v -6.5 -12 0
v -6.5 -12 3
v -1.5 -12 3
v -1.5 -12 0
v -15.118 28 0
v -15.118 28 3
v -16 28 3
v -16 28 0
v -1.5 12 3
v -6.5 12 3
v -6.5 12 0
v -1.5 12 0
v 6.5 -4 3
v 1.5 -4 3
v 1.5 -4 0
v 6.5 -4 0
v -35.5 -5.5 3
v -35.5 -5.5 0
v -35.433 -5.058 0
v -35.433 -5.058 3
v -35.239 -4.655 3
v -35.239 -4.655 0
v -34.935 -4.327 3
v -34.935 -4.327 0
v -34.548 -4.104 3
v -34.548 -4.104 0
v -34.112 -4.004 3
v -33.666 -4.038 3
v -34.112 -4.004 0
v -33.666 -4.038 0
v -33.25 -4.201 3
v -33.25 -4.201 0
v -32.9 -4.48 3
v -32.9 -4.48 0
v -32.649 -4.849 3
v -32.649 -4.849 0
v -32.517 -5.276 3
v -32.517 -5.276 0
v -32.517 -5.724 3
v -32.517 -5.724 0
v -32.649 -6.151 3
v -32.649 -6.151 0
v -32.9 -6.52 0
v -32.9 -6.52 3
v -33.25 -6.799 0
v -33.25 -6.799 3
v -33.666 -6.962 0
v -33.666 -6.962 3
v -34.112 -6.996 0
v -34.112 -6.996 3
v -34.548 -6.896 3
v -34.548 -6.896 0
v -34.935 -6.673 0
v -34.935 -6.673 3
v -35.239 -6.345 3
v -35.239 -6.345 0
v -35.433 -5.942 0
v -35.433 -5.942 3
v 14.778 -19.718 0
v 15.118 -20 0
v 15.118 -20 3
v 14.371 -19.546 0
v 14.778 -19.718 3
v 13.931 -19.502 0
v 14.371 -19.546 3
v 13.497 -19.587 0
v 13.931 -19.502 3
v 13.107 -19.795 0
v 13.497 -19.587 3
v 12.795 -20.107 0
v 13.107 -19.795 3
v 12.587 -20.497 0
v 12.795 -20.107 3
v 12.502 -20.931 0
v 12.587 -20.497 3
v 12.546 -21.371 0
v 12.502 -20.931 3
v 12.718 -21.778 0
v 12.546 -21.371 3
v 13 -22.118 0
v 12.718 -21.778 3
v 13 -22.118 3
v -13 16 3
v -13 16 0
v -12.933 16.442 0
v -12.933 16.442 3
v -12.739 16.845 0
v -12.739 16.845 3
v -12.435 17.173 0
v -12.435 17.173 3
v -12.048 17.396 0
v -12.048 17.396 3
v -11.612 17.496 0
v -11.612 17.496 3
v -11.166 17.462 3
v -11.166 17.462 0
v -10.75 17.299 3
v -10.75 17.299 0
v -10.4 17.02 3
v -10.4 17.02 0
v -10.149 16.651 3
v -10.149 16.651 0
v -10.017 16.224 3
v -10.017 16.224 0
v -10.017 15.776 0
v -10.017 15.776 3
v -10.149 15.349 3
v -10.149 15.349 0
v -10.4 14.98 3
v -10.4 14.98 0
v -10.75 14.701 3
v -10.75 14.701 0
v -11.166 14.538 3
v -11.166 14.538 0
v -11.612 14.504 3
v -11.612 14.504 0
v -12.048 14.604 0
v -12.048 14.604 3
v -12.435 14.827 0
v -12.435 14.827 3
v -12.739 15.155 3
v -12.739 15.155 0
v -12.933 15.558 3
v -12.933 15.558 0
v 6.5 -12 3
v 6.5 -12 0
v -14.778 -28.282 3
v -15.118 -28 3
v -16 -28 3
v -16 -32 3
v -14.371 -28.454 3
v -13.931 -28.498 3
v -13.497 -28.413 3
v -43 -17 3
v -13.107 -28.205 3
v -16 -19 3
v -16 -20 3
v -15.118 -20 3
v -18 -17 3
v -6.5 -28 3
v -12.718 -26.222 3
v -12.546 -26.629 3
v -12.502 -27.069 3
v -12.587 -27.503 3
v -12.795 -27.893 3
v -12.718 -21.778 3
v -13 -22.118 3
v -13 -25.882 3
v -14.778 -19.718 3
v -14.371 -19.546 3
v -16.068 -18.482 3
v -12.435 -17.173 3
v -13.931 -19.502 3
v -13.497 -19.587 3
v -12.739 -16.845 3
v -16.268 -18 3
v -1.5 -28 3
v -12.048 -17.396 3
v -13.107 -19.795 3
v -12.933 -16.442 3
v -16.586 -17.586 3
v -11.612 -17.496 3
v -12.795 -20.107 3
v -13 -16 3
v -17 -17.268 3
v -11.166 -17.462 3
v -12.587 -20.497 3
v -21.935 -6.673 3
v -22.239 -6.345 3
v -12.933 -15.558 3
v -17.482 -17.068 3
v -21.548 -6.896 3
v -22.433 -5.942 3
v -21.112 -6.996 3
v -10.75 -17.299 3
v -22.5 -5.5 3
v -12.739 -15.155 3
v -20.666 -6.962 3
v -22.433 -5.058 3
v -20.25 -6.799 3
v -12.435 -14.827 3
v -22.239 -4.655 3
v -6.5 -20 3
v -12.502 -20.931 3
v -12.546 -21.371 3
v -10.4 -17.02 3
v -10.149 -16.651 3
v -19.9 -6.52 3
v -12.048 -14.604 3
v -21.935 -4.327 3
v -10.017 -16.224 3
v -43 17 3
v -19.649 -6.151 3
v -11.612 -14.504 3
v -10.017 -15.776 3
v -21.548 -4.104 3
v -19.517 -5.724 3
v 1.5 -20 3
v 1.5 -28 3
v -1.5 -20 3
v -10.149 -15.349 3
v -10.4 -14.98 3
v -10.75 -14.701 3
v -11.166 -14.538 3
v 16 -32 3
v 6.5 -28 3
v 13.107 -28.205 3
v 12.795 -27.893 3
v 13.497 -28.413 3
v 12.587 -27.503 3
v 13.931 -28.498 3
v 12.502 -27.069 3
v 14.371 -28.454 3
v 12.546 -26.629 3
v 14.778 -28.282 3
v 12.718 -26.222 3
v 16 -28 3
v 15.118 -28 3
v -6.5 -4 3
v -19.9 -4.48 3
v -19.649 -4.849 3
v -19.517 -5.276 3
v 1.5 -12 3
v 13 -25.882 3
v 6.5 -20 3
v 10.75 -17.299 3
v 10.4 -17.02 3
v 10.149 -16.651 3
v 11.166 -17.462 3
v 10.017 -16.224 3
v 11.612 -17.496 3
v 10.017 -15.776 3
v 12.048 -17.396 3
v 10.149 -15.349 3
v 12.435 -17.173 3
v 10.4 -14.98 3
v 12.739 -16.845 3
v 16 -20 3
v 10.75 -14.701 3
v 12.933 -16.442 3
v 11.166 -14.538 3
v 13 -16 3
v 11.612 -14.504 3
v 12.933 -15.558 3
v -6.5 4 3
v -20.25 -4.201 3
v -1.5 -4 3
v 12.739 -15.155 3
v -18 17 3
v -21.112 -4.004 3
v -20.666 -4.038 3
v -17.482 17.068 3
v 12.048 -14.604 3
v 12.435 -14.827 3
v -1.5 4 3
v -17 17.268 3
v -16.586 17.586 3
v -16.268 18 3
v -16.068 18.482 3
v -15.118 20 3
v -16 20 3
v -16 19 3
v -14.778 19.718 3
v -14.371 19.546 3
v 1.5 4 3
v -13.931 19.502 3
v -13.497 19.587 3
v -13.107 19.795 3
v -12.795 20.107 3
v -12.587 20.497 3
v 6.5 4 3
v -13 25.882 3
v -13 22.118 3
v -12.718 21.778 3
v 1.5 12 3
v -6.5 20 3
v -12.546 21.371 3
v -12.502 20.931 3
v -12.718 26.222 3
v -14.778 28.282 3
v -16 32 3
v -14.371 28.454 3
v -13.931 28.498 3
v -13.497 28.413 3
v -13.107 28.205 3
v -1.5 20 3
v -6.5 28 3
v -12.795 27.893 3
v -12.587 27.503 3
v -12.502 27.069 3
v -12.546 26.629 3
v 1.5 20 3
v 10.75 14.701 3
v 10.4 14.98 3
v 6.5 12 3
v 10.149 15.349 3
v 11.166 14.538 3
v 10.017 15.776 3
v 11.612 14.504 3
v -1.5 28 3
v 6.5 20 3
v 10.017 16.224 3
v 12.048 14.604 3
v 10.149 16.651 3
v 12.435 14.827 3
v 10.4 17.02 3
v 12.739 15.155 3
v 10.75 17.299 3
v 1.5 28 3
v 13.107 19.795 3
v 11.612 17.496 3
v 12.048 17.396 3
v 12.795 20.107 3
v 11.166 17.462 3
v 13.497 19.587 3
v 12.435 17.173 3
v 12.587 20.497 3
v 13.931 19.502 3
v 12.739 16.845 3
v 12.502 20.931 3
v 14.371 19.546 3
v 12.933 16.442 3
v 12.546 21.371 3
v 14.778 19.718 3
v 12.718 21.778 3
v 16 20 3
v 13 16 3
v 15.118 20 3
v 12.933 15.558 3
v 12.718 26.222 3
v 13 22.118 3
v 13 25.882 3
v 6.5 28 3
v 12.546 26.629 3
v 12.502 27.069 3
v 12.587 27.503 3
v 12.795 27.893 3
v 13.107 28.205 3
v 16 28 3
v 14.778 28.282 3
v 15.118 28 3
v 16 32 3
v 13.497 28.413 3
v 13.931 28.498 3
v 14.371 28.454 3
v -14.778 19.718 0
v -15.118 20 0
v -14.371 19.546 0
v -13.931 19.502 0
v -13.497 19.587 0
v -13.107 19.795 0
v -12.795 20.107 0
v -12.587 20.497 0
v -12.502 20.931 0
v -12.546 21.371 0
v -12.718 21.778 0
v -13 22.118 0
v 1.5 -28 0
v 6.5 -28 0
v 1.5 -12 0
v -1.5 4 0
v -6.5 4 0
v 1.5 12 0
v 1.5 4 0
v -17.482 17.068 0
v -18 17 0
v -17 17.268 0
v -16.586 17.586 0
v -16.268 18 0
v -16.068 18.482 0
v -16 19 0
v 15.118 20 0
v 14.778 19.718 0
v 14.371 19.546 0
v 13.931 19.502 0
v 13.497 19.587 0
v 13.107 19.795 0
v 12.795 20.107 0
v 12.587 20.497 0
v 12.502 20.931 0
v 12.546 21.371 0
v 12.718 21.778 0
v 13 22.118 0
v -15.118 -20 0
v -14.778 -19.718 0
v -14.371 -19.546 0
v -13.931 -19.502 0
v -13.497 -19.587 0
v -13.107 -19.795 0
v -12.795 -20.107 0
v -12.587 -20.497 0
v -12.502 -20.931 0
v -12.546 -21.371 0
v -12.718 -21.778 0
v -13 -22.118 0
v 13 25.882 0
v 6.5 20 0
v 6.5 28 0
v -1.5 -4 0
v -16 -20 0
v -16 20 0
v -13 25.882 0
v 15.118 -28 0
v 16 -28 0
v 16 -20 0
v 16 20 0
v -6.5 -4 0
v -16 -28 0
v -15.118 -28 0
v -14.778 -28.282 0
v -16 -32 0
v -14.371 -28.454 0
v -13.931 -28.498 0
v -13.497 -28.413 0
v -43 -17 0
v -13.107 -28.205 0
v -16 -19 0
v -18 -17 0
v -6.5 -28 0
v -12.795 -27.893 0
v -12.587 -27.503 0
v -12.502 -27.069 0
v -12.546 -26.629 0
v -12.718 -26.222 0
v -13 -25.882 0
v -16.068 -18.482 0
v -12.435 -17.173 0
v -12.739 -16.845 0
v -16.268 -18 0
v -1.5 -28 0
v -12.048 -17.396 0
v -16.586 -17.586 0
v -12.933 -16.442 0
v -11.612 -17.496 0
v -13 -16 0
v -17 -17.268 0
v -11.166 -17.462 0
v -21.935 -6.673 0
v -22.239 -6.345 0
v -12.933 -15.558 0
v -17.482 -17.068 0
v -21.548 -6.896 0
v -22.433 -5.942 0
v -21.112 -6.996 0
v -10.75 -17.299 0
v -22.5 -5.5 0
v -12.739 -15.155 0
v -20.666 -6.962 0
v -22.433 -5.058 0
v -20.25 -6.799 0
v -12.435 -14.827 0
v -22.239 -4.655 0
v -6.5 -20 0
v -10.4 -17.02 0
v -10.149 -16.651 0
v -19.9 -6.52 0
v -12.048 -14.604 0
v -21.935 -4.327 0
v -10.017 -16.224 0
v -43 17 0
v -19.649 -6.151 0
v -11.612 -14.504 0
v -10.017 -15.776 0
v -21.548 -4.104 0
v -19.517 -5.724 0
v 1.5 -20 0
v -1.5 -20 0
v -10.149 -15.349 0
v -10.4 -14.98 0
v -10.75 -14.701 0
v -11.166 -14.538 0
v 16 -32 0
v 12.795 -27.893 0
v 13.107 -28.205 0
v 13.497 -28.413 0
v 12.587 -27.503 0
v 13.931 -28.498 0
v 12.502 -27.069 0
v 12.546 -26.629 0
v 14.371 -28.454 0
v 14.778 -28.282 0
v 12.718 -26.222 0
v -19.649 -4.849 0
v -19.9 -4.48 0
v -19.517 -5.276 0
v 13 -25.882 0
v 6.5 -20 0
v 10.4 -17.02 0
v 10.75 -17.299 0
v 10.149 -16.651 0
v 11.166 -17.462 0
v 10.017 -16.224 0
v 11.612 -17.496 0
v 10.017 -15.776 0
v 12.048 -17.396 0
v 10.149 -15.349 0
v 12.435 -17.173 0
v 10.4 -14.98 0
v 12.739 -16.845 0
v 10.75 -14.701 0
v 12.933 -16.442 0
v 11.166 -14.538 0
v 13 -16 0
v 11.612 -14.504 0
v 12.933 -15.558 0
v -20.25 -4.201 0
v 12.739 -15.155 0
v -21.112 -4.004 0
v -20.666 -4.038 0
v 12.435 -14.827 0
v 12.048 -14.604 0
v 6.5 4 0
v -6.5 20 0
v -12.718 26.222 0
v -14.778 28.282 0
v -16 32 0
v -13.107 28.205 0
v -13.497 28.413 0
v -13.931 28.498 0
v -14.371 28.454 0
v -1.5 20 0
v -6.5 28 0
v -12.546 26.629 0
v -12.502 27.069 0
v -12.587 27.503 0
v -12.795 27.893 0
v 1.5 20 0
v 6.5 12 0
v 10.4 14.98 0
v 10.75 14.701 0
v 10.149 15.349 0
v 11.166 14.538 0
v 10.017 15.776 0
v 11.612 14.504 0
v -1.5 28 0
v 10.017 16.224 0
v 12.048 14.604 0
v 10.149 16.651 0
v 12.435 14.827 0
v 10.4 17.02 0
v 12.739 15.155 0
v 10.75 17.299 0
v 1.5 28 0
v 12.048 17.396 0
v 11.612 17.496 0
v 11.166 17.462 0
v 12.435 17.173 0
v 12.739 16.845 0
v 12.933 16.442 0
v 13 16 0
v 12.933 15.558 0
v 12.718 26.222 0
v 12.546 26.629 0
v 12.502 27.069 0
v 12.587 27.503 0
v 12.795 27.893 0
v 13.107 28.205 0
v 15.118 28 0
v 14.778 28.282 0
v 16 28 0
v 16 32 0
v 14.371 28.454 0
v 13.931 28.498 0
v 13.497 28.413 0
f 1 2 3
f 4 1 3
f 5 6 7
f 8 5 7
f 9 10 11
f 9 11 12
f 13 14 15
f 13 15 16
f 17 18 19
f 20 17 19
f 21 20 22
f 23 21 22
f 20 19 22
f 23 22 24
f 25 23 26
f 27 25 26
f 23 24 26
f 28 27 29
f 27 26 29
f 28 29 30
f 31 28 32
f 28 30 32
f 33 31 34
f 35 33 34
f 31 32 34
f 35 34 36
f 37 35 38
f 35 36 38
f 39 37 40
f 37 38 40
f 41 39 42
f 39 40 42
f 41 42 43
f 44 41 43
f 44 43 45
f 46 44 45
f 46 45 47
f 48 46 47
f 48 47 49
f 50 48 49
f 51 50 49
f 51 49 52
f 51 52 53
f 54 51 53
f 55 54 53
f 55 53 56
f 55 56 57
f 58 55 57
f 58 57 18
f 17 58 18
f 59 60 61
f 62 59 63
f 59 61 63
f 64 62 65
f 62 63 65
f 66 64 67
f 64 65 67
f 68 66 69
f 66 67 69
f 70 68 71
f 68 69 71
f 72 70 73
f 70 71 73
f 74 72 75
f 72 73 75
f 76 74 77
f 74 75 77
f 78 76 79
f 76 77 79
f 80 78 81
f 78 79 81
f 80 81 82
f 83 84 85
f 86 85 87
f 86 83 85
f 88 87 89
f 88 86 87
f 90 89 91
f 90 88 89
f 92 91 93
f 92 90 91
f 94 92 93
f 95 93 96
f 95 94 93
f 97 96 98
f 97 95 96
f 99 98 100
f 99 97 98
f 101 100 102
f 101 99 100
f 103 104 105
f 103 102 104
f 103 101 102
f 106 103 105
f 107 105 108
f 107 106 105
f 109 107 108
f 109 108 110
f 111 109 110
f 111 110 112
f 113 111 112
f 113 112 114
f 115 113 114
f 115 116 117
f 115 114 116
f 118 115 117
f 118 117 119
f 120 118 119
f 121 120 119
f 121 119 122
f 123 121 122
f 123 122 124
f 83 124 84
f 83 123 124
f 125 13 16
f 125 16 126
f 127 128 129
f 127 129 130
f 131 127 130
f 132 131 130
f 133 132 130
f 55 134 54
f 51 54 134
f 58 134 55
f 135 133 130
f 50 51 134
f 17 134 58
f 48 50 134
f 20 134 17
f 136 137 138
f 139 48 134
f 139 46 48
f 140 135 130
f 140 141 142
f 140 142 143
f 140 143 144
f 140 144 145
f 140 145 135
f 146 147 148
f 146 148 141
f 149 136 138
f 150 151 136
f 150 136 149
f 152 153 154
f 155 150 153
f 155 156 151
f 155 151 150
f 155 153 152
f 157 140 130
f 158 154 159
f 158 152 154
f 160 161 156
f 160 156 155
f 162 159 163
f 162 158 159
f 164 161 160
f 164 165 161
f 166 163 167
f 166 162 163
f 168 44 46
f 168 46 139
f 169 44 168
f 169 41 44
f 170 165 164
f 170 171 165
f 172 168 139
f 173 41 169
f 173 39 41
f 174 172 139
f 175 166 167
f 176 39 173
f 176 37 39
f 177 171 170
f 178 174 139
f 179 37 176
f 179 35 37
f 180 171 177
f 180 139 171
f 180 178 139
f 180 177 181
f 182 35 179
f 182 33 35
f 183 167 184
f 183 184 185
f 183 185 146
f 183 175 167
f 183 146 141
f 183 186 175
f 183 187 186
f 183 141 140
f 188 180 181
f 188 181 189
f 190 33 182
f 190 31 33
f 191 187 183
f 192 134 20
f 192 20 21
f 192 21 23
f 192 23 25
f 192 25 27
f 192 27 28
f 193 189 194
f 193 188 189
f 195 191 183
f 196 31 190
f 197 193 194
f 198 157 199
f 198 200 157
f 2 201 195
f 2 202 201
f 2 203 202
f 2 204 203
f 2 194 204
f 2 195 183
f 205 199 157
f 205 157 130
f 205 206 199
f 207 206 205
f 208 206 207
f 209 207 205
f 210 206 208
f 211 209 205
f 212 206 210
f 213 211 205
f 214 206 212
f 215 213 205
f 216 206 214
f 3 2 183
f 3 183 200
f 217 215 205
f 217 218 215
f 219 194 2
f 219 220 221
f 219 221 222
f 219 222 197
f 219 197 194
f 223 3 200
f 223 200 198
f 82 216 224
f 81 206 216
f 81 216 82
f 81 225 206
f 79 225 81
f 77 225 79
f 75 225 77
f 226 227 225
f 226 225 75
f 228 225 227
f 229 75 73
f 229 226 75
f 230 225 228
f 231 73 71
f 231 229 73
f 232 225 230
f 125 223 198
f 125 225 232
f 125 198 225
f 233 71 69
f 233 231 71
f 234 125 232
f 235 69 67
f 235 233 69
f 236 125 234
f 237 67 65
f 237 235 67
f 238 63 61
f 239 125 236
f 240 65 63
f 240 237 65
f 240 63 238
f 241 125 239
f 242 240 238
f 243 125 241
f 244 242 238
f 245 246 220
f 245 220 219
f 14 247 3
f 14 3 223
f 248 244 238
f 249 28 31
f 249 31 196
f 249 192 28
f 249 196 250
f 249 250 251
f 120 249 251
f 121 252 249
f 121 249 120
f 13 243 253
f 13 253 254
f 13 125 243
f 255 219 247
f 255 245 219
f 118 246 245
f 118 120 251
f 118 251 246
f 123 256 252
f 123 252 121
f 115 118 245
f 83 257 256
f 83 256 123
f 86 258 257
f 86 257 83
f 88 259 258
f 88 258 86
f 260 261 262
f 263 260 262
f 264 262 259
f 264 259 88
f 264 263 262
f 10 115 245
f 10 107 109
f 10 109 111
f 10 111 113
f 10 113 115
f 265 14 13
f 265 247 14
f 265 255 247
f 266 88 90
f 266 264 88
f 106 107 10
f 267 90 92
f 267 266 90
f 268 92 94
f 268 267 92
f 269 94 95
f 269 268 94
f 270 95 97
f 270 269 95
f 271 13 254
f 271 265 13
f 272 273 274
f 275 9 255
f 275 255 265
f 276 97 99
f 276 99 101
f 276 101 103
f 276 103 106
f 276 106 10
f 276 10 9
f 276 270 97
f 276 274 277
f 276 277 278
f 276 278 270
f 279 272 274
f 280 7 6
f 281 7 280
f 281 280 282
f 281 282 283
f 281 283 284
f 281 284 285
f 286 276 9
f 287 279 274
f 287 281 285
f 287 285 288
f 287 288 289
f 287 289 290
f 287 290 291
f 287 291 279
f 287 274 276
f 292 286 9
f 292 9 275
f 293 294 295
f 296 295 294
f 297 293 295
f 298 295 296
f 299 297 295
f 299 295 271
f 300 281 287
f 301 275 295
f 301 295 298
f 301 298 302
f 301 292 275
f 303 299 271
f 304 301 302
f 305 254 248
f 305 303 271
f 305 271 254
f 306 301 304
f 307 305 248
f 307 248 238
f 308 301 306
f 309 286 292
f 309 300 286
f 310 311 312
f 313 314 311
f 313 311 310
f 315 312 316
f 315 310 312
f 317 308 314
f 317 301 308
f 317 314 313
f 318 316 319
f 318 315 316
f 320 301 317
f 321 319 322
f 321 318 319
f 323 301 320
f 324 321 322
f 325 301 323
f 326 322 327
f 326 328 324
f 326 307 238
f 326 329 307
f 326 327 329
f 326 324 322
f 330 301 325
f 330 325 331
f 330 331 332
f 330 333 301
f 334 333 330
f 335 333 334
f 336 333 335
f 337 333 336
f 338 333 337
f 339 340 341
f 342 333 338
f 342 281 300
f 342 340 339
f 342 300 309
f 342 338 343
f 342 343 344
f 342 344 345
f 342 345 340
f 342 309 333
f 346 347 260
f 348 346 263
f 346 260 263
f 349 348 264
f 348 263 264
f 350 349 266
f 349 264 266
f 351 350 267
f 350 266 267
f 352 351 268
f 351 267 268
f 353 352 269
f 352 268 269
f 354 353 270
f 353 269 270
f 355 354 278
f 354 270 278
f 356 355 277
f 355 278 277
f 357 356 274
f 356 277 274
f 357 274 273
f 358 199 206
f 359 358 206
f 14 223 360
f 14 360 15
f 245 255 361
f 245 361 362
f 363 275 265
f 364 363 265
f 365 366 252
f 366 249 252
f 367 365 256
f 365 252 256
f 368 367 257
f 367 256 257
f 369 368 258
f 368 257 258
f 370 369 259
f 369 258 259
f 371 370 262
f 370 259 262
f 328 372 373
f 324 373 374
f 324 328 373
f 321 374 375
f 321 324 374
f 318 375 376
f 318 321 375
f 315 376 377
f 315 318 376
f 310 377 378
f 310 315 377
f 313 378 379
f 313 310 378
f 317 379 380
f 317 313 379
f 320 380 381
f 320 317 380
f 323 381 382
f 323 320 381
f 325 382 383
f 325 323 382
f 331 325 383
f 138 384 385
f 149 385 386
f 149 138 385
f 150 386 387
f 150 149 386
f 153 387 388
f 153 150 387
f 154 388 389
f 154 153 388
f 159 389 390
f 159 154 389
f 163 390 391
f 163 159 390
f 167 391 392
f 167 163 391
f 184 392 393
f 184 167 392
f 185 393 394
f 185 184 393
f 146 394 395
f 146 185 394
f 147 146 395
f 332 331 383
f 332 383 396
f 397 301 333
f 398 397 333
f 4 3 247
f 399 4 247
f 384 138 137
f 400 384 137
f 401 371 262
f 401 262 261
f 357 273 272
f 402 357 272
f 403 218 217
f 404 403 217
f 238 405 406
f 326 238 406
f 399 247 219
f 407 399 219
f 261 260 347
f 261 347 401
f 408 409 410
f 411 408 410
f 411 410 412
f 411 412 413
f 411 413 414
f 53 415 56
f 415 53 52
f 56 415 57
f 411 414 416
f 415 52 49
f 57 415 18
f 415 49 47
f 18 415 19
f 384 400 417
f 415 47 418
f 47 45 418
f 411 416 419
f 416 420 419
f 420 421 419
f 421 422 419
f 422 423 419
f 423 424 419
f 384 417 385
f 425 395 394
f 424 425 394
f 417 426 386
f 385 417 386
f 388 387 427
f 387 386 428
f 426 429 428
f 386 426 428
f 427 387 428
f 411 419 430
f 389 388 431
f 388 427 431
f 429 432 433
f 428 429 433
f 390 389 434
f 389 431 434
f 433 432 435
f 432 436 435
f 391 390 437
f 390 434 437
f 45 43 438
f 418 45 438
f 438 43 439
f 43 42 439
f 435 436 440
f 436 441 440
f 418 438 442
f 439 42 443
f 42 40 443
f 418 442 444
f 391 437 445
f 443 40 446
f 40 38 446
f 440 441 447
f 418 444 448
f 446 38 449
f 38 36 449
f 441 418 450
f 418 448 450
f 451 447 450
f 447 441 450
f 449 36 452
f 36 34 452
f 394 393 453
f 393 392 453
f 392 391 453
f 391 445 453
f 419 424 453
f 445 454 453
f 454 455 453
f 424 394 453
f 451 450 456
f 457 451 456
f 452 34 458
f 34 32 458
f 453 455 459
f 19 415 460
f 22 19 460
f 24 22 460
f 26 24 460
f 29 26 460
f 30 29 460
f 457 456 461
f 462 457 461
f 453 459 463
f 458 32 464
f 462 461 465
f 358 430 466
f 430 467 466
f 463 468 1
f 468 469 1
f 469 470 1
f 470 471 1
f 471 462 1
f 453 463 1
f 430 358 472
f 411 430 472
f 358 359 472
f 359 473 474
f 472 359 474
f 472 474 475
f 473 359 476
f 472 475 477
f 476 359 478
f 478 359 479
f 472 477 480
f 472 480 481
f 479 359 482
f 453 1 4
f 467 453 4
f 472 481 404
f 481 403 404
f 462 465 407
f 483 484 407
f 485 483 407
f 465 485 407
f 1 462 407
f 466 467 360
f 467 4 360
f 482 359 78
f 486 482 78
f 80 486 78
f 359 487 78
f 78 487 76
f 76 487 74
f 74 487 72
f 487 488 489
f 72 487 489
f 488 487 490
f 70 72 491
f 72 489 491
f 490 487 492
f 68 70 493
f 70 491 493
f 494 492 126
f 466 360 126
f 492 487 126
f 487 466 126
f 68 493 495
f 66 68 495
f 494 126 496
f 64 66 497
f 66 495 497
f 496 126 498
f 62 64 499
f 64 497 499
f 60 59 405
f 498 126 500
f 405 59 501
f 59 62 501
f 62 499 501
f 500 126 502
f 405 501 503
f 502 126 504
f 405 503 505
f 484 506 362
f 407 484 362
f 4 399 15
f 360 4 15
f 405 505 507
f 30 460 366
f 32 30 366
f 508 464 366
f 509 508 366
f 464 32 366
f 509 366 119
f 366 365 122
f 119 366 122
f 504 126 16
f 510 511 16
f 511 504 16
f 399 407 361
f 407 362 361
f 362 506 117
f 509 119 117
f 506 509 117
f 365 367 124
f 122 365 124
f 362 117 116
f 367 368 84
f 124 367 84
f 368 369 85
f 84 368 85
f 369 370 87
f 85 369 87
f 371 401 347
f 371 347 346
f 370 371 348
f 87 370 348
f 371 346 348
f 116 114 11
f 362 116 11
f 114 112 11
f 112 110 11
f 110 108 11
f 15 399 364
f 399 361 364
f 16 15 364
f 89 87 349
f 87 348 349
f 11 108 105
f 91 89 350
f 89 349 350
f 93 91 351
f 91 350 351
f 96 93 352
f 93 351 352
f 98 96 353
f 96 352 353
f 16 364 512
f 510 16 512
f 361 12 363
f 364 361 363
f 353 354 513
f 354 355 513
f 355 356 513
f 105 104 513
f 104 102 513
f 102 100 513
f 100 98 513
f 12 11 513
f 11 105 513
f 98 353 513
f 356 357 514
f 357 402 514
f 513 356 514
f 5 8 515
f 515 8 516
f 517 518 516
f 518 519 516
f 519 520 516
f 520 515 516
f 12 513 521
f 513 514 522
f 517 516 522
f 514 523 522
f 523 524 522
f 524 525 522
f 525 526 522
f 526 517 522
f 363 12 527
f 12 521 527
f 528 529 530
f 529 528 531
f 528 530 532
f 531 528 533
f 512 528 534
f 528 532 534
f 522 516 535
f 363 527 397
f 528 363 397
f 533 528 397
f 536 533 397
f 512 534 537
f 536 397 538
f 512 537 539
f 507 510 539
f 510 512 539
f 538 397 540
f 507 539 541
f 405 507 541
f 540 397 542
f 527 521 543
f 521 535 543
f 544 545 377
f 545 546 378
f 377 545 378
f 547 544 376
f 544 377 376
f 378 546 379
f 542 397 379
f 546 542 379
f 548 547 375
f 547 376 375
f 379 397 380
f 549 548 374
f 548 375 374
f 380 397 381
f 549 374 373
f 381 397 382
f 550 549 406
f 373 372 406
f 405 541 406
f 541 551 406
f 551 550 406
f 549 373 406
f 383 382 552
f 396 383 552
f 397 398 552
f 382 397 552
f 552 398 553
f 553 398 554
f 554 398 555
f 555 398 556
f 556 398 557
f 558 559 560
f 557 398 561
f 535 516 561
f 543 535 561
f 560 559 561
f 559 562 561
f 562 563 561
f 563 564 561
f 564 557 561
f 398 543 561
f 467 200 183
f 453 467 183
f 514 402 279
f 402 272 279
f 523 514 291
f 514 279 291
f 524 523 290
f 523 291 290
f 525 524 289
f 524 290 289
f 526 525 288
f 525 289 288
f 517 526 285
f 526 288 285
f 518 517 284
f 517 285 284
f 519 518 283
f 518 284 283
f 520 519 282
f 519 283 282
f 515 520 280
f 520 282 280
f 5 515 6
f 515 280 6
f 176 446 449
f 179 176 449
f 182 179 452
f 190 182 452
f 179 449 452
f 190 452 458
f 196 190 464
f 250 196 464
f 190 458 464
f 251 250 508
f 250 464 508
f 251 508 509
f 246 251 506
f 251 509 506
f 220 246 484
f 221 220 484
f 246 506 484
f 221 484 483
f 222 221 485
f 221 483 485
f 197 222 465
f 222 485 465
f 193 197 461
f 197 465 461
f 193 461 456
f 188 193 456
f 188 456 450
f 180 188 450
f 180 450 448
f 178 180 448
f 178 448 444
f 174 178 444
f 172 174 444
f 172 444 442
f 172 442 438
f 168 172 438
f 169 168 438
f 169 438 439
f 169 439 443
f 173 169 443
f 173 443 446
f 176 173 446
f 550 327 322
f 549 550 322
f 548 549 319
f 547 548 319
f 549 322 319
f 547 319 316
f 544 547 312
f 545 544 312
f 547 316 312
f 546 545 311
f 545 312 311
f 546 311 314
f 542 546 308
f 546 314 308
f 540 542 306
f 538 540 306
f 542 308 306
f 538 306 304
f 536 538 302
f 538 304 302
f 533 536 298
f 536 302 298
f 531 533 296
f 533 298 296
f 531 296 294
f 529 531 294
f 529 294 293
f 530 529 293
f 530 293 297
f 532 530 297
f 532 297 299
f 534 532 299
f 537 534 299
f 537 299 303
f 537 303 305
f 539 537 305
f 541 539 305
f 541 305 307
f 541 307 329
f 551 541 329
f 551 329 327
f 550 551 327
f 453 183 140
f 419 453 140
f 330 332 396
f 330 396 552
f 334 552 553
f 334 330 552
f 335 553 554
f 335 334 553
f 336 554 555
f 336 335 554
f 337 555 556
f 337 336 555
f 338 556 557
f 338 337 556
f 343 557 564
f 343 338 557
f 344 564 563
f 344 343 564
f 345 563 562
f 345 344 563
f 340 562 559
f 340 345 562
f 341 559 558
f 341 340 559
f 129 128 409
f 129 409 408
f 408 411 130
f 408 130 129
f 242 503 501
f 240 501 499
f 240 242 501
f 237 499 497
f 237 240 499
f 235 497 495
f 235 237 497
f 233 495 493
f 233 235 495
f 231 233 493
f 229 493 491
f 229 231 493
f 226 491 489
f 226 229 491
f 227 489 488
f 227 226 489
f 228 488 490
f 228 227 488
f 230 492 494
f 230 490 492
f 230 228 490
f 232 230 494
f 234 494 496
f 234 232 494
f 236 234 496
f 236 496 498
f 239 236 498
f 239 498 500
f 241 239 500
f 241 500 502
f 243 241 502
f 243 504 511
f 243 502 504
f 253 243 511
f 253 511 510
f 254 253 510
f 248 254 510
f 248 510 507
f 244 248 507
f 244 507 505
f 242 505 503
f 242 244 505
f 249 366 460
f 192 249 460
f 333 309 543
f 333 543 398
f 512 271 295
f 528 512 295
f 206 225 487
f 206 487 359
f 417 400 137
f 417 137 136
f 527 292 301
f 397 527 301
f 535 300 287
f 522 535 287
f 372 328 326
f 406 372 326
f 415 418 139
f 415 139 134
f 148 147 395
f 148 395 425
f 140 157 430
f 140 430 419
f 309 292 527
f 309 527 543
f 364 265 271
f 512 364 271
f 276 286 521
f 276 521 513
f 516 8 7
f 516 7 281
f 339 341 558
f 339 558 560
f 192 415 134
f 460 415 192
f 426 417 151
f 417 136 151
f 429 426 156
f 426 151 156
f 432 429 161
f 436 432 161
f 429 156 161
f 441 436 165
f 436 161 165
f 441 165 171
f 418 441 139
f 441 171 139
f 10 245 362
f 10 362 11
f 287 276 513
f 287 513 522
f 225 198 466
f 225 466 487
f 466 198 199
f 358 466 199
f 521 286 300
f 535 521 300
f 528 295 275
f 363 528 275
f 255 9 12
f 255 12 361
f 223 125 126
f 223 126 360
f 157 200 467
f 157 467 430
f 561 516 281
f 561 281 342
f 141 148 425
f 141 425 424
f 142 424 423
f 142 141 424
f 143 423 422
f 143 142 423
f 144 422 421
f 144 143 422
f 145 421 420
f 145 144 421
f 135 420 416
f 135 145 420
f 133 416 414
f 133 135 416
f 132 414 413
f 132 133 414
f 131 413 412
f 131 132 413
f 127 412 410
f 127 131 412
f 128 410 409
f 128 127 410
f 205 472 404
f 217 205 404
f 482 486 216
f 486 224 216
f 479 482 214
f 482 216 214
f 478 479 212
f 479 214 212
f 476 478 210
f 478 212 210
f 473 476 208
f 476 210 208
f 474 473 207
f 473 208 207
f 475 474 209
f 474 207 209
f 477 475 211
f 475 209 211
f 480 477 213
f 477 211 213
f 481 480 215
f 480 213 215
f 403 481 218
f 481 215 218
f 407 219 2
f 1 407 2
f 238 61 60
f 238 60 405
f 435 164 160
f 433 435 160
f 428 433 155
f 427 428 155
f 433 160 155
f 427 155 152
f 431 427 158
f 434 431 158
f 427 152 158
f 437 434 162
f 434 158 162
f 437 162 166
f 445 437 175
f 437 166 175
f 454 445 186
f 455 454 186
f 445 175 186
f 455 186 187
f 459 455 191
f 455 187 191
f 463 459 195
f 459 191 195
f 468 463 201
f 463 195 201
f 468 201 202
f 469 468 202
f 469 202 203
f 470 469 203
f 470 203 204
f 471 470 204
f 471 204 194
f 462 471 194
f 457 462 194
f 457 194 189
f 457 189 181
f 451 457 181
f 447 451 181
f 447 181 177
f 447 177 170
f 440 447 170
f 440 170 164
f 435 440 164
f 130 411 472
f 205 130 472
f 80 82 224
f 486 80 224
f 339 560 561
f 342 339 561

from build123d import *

# Parameters (mm, degrees)
SKETCH_1_W                = 32
SKETCH_1_H                = 64
EXTRUDE_1_DEPTH           = 3
SKETCH_2_W                = 2.5
SKETCH_2_H                = 4
CUT_EXTRUDE_1_DEPTH       = 36.902646142
MIRROR_2_COPY_1_SKETCH_W  = 2.5
MIRROR_2_COPY_1_SKETCH_H  = 4
MIRROR_2_COPY_1_DEPTH     = 36.902646142
SKETCH_4_W                = 3
SKETCH_4_H                = 8
CUT_EXTRUDE_3_DEPTH       = 36.902646142
MIRROR_6_COPY_1_SKETCH_W  = 3
MIRROR_6_COPY_1_SKETCH_H  = 8
MIRROR_6_COPY_1_DEPTH     = 36.902646142
SKETCH_6_W                = 3
SKETCH_6_H                = 8
CUT_EXTRUDE_4_DEPTH       = 36.902646142
MIRROR_8_COPY_1_SKETCH_W  = 3
MIRROR_8_COPY_1_SKETCH_H  = 8
MIRROR_8_COPY_1_DEPTH     = 36.902646142
SKETCH_7_R                = 1.5
CUT_EXTRUDE_5_DEPTH       = 36.902646142
MIRROR_10_COPY_1_SKETCH_R = 1.5
MIRROR_10_COPY_1_DEPTH    = 36.902646142
SKETCH_8_R                = 1.5
CUT_EXTRUDE_6_DEPTH       = 36.902646142
MIRROR_12_COPY_1_SKETCH_R = 1.5
MIRROR_12_COPY_1_DEPTH    = 36.902646142
SKETCH_11_R               = 1.5
CUT_EXTRUDE_9_DEPTH       = 36.902646142
MIRROR_16_COPY_1_SKETCH_R = 1.5
MIRROR_16_COPY_1_DEPTH    = 36.902646142
SKETCH_12_W               = 5
SKETCH_12_H               = 8
CUT_EXTRUDE_10_DEPTH      = 36.902646142
MIRROR_18_COPY_1_SKETCH_W = 5
MIRROR_18_COPY_1_SKETCH_H = 8
MIRROR_18_COPY_1_DEPTH    = 36.902646142
SKETCH_13_W               = 3.954651238
SKETCH_13_H               = 10.848263898
SKETCH_13_W_2             = 4.227382692
SKETCH_13_H_2             = 10.655405874
EXTRUDE_2_DEPTH           = 3
SKETCH_14_W               = 27
SKETCH_14_H               = 34
EXTRUDE_3_DEPTH           = 3
SKETCH_15_R               = 1.5
CUT_EXTRUDE_11_DEPTH      = 54.684262126
FILLET_1_R                = 2


with BuildPart() as part:
    # 草图1 → 凸台-拉伸1 (new body)
    with BuildSketch(Plane.XY):
        Rectangle(SKETCH_1_W, SKETCH_1_H)
    extrude(amount=EXTRUDE_1_DEPTH)

    # 草图2 → 切除-拉伸1 (cut, through all)
    with BuildSketch(Plane.XY.offset(3)):
        Polygon((4, 8), (4, 4), (6.5, 4), (6.5, 12), (1.5, 12), (1.5, 8), align=None)
        with Locations((2.75, 6)):
            Rectangle(SKETCH_2_W, SKETCH_2_H)
    cut_extrude_1 = extrude(amount=-CUT_EXTRUDE_1_DEPTH, mode=Mode.SUBTRACT)

    # 镜向1: 切除-拉伸1 across plane
    add(cut_extrude_1.mirror(Plane(origin=(0, 0, 0), x_dir=(0, 0, 1), z_dir=(1, 0, 0))), mode=Mode.SUBTRACT)

    # 镜向2: 切除-拉伸1 across plane
    add(cut_extrude_1.mirror(Plane.ZX), mode=Mode.SUBTRACT)

    # 镜向2 copy 1 sketch → 镜向2 copy 1 (cut, through all)
    with BuildSketch(Plane(origin=(0, 0, 3), x_dir=(-1, 0, 0), z_dir=(0, 0, 1))):
        Polygon((4, 8), (4, 4), (6.5, 4), (6.5, 12), (1.5, 12), (1.5, 8), align=None)
        with Locations((2.75, 6)):
            Rectangle(MIRROR_2_COPY_1_SKETCH_W, MIRROR_2_COPY_1_SKETCH_H)
    extrude(amount=-MIRROR_2_COPY_1_DEPTH, mode=Mode.SUBTRACT)

    # 草图4 → 切除-拉伸3 (cut, through all)
    with BuildSketch(Plane.XY.offset(3)):
        with Locations((14.5, 8)):
            Rectangle(SKETCH_4_W, SKETCH_4_H)
    cut_extrude_3 = extrude(amount=-CUT_EXTRUDE_3_DEPTH, mode=Mode.SUBTRACT)

    # 镜向5: 切除-拉伸3 across plane
    add(cut_extrude_3.mirror(Plane(origin=(0, 0, 0), x_dir=(0, 0, 1), z_dir=(1, 0, 0))), mode=Mode.SUBTRACT)

    # 镜向6: 切除-拉伸3 across plane
    add(cut_extrude_3.mirror(Plane.ZX), mode=Mode.SUBTRACT)

    # 镜向6 copy 1 sketch → 镜向6 copy 1 (cut, through all)
    with BuildSketch(Plane(origin=(0, 0, 3), x_dir=(-1, 0, 0), z_dir=(0, 0, 1))):
        with Locations((14.5, 8)):
            Rectangle(MIRROR_6_COPY_1_SKETCH_W, MIRROR_6_COPY_1_SKETCH_H)
    extrude(amount=-MIRROR_6_COPY_1_DEPTH, mode=Mode.SUBTRACT)

    # 草图6 → 切除-拉伸4 (cut, through all)
    with BuildSketch(Plane.XY.offset(3)):
        with Locations((14.5, 24)):
            Rectangle(SKETCH_6_W, SKETCH_6_H)
    cut_extrude_4 = extrude(amount=-CUT_EXTRUDE_4_DEPTH, mode=Mode.SUBTRACT)

    # 镜向7: 切除-拉伸4 across plane
    add(cut_extrude_4.mirror(Plane(origin=(0, 0, 0), x_dir=(0, 0, 1), z_dir=(1, 0, 0))), mode=Mode.SUBTRACT)

    # 镜向8: 切除-拉伸4 across plane
    add(cut_extrude_4.mirror(Plane.ZX), mode=Mode.SUBTRACT)

    # 镜向8 copy 1 sketch → 镜向8 copy 1 (cut, through all)
    with BuildSketch(Plane(origin=(0, 0, 3), x_dir=(-1, 0, 0), z_dir=(0, 0, 1))):
        with Locations((14.5, 24)):
            Rectangle(MIRROR_8_COPY_1_SKETCH_W, MIRROR_8_COPY_1_SKETCH_H)
    extrude(amount=-MIRROR_8_COPY_1_DEPTH, mode=Mode.SUBTRACT)

    # 草图7 → 切除-拉伸5 (cut, through all)
    with BuildSketch(Plane.XY.offset(3)):
        with Locations((-14, 27)):
            Circle(SKETCH_7_R)
        with Locations((-14, 21)):
            Circle(SKETCH_7_R)
    cut_extrude_5 = extrude(amount=-CUT_EXTRUDE_5_DEPTH, mode=Mode.SUBTRACT)

    # 镜向9: 切除-拉伸5 across plane
    add(cut_extrude_5.mirror(Plane(origin=(0, 0, 0), x_dir=(0, 0, 1), z_dir=(1, 0, 0))), mode=Mode.SUBTRACT)

    # 镜向10: 切除-拉伸5 across plane
    add(cut_extrude_5.mirror(Plane.ZX), mode=Mode.SUBTRACT)

    # 镜向10 copy 1 sketch → 镜向10 copy 1 (cut, through all)
    with BuildSketch(Plane(origin=(0, 0, 3), x_dir=(-1, 0, 0), z_dir=(0, 0, 1))):
        with Locations((-14, 27)):
            Circle(MIRROR_10_COPY_1_SKETCH_R)
        with Locations((-14, 21)):
            Circle(MIRROR_10_COPY_1_SKETCH_R)
    extrude(amount=-MIRROR_10_COPY_1_DEPTH, mode=Mode.SUBTRACT)

    # 草图8 → 切除-拉伸6 (cut, through all)
    with BuildSketch(Plane.XY.offset(3)):
        with Locations((-14, 11)):
            Circle(SKETCH_8_R)
        with Locations((-14, 5)):
            Circle(SKETCH_8_R)
    cut_extrude_6 = extrude(amount=-CUT_EXTRUDE_6_DEPTH, mode=Mode.SUBTRACT)

    # 镜向11: 切除-拉伸6 across plane
    add(cut_extrude_6.mirror(Plane(origin=(0, 0, 0), x_dir=(0, 0, 1), z_dir=(1, 0, 0))), mode=Mode.SUBTRACT)

    # 镜向12: 切除-拉伸6 across plane
    add(cut_extrude_6.mirror(Plane.ZX), mode=Mode.SUBTRACT)

    # 镜向12 copy 1 sketch → 镜向12 copy 1 (cut, through all)
    with BuildSketch(Plane(origin=(0, 0, 3), x_dir=(-1, 0, 0), z_dir=(0, 0, 1))):
        with Locations((-14, 11)):
            Circle(MIRROR_12_COPY_1_SKETCH_R)
        with Locations((-14, 5)):
            Circle(MIRROR_12_COPY_1_SKETCH_R)
    extrude(amount=-MIRROR_12_COPY_1_DEPTH, mode=Mode.SUBTRACT)

    # 草图11 → 切除-拉伸9 (cut, through all)
    with BuildSketch(Plane.XY.offset(3)):
        with Locations((11.5, 16)):
            Circle(SKETCH_11_R)
    cut_extrude_9 = extrude(amount=-CUT_EXTRUDE_9_DEPTH, mode=Mode.SUBTRACT)

    # 镜向15: 切除-拉伸9 across plane
    add(cut_extrude_9.mirror(Plane(origin=(0, 0, 0), x_dir=(0, 0, 1), z_dir=(1, 0, 0))), mode=Mode.SUBTRACT)

    # 镜向16: 切除-拉伸9 across plane
    add(cut_extrude_9.mirror(Plane.ZX), mode=Mode.SUBTRACT)

    # 镜向16 copy 1 sketch → 镜向16 copy 1 (cut, through all)
    with BuildSketch(Plane(origin=(0, 0, 3), x_dir=(-1, 0, 0), z_dir=(0, 0, 1))):
        with Locations((11.5, 16)):
            Circle(MIRROR_16_COPY_1_SKETCH_R)
    extrude(amount=-MIRROR_16_COPY_1_DEPTH, mode=Mode.SUBTRACT)

    # 草图12 → 切除-拉伸10 (cut, through all)
    with BuildSketch(Plane.XY.offset(3)):
        with Locations((4, 24)):
            Rectangle(SKETCH_12_W, SKETCH_12_H)
    cut_extrude_10 = extrude(amount=-CUT_EXTRUDE_10_DEPTH, mode=Mode.SUBTRACT)

    # 镜向17: 切除-拉伸10 across plane
    add(cut_extrude_10.mirror(Plane(origin=(0, 0, 0), x_dir=(0, 0, 1), z_dir=(1, 0, 0))), mode=Mode.SUBTRACT)

    # 镜向18: 切除-拉伸10 across plane
    add(cut_extrude_10.mirror(Plane.ZX), mode=Mode.SUBTRACT)

    # 镜向18 copy 1 sketch → 镜向18 copy 1 (cut, through all)
    with BuildSketch(Plane(origin=(0, 0, 3), x_dir=(-1, 0, 0), z_dir=(0, 0, 1))):
        with Locations((4, 24)):
            Rectangle(MIRROR_18_COPY_1_SKETCH_W, MIRROR_18_COPY_1_SKETCH_H)
    extrude(amount=-MIRROR_18_COPY_1_DEPTH, mode=Mode.SUBTRACT)

    # 草图13 → 凸台-拉伸2 (add)
    with BuildSketch(Plane.XY.offset(3)):
        with Locations((-14.022674381, 8.035470268)):
            Rectangle(SKETCH_13_W, SKETCH_13_H)
        with Locations((13.886308654, 8.035470268)):
            Rectangle(SKETCH_13_W_2, SKETCH_13_H)
        with Locations((13.886308654, -7.875316782)):
            Rectangle(SKETCH_13_W_2, SKETCH_13_H_2)
        with Locations((-14.022674381, -7.875316782)):
            Rectangle(SKETCH_13_W, SKETCH_13_H_2)
    extrude(amount=-EXTRUDE_2_DEPTH)

    # 草图14 → 凸台-拉伸3 (add)
    with BuildSketch(Plane(origin=(0, 0, 0), x_dir=(-1, 0, 0), z_dir=(0, 0, -1))):
        with Locations((29.5, 0)):
            Rectangle(SKETCH_14_W, SKETCH_14_H)
    extrude(amount=-EXTRUDE_3_DEPTH)

    # 草图15 → 切除-拉伸11 (cut, through all)
    with BuildSketch(Plane(origin=(0, 0, 0), x_dir=(-1, 0, 0), z_dir=(0, 0, -1))):
        with Locations((34, -5.5)):
            Circle(SKETCH_15_R)
        with Locations((21, -5.5)):
            Circle(SKETCH_15_R)
    extrude(amount=-CUT_EXTRUDE_11_DEPTH, mode=Mode.SUBTRACT)

    # 圆角1
    fillet_1_edges = [part.edges().sort_by_distance(p)[0] for p in [
        (-16, -17, 1.5),
        (-16, 17, 1.5),
    ]]
    fillet(fillet_1_edges, radius=FILLET_1_R)


solid = part.part
